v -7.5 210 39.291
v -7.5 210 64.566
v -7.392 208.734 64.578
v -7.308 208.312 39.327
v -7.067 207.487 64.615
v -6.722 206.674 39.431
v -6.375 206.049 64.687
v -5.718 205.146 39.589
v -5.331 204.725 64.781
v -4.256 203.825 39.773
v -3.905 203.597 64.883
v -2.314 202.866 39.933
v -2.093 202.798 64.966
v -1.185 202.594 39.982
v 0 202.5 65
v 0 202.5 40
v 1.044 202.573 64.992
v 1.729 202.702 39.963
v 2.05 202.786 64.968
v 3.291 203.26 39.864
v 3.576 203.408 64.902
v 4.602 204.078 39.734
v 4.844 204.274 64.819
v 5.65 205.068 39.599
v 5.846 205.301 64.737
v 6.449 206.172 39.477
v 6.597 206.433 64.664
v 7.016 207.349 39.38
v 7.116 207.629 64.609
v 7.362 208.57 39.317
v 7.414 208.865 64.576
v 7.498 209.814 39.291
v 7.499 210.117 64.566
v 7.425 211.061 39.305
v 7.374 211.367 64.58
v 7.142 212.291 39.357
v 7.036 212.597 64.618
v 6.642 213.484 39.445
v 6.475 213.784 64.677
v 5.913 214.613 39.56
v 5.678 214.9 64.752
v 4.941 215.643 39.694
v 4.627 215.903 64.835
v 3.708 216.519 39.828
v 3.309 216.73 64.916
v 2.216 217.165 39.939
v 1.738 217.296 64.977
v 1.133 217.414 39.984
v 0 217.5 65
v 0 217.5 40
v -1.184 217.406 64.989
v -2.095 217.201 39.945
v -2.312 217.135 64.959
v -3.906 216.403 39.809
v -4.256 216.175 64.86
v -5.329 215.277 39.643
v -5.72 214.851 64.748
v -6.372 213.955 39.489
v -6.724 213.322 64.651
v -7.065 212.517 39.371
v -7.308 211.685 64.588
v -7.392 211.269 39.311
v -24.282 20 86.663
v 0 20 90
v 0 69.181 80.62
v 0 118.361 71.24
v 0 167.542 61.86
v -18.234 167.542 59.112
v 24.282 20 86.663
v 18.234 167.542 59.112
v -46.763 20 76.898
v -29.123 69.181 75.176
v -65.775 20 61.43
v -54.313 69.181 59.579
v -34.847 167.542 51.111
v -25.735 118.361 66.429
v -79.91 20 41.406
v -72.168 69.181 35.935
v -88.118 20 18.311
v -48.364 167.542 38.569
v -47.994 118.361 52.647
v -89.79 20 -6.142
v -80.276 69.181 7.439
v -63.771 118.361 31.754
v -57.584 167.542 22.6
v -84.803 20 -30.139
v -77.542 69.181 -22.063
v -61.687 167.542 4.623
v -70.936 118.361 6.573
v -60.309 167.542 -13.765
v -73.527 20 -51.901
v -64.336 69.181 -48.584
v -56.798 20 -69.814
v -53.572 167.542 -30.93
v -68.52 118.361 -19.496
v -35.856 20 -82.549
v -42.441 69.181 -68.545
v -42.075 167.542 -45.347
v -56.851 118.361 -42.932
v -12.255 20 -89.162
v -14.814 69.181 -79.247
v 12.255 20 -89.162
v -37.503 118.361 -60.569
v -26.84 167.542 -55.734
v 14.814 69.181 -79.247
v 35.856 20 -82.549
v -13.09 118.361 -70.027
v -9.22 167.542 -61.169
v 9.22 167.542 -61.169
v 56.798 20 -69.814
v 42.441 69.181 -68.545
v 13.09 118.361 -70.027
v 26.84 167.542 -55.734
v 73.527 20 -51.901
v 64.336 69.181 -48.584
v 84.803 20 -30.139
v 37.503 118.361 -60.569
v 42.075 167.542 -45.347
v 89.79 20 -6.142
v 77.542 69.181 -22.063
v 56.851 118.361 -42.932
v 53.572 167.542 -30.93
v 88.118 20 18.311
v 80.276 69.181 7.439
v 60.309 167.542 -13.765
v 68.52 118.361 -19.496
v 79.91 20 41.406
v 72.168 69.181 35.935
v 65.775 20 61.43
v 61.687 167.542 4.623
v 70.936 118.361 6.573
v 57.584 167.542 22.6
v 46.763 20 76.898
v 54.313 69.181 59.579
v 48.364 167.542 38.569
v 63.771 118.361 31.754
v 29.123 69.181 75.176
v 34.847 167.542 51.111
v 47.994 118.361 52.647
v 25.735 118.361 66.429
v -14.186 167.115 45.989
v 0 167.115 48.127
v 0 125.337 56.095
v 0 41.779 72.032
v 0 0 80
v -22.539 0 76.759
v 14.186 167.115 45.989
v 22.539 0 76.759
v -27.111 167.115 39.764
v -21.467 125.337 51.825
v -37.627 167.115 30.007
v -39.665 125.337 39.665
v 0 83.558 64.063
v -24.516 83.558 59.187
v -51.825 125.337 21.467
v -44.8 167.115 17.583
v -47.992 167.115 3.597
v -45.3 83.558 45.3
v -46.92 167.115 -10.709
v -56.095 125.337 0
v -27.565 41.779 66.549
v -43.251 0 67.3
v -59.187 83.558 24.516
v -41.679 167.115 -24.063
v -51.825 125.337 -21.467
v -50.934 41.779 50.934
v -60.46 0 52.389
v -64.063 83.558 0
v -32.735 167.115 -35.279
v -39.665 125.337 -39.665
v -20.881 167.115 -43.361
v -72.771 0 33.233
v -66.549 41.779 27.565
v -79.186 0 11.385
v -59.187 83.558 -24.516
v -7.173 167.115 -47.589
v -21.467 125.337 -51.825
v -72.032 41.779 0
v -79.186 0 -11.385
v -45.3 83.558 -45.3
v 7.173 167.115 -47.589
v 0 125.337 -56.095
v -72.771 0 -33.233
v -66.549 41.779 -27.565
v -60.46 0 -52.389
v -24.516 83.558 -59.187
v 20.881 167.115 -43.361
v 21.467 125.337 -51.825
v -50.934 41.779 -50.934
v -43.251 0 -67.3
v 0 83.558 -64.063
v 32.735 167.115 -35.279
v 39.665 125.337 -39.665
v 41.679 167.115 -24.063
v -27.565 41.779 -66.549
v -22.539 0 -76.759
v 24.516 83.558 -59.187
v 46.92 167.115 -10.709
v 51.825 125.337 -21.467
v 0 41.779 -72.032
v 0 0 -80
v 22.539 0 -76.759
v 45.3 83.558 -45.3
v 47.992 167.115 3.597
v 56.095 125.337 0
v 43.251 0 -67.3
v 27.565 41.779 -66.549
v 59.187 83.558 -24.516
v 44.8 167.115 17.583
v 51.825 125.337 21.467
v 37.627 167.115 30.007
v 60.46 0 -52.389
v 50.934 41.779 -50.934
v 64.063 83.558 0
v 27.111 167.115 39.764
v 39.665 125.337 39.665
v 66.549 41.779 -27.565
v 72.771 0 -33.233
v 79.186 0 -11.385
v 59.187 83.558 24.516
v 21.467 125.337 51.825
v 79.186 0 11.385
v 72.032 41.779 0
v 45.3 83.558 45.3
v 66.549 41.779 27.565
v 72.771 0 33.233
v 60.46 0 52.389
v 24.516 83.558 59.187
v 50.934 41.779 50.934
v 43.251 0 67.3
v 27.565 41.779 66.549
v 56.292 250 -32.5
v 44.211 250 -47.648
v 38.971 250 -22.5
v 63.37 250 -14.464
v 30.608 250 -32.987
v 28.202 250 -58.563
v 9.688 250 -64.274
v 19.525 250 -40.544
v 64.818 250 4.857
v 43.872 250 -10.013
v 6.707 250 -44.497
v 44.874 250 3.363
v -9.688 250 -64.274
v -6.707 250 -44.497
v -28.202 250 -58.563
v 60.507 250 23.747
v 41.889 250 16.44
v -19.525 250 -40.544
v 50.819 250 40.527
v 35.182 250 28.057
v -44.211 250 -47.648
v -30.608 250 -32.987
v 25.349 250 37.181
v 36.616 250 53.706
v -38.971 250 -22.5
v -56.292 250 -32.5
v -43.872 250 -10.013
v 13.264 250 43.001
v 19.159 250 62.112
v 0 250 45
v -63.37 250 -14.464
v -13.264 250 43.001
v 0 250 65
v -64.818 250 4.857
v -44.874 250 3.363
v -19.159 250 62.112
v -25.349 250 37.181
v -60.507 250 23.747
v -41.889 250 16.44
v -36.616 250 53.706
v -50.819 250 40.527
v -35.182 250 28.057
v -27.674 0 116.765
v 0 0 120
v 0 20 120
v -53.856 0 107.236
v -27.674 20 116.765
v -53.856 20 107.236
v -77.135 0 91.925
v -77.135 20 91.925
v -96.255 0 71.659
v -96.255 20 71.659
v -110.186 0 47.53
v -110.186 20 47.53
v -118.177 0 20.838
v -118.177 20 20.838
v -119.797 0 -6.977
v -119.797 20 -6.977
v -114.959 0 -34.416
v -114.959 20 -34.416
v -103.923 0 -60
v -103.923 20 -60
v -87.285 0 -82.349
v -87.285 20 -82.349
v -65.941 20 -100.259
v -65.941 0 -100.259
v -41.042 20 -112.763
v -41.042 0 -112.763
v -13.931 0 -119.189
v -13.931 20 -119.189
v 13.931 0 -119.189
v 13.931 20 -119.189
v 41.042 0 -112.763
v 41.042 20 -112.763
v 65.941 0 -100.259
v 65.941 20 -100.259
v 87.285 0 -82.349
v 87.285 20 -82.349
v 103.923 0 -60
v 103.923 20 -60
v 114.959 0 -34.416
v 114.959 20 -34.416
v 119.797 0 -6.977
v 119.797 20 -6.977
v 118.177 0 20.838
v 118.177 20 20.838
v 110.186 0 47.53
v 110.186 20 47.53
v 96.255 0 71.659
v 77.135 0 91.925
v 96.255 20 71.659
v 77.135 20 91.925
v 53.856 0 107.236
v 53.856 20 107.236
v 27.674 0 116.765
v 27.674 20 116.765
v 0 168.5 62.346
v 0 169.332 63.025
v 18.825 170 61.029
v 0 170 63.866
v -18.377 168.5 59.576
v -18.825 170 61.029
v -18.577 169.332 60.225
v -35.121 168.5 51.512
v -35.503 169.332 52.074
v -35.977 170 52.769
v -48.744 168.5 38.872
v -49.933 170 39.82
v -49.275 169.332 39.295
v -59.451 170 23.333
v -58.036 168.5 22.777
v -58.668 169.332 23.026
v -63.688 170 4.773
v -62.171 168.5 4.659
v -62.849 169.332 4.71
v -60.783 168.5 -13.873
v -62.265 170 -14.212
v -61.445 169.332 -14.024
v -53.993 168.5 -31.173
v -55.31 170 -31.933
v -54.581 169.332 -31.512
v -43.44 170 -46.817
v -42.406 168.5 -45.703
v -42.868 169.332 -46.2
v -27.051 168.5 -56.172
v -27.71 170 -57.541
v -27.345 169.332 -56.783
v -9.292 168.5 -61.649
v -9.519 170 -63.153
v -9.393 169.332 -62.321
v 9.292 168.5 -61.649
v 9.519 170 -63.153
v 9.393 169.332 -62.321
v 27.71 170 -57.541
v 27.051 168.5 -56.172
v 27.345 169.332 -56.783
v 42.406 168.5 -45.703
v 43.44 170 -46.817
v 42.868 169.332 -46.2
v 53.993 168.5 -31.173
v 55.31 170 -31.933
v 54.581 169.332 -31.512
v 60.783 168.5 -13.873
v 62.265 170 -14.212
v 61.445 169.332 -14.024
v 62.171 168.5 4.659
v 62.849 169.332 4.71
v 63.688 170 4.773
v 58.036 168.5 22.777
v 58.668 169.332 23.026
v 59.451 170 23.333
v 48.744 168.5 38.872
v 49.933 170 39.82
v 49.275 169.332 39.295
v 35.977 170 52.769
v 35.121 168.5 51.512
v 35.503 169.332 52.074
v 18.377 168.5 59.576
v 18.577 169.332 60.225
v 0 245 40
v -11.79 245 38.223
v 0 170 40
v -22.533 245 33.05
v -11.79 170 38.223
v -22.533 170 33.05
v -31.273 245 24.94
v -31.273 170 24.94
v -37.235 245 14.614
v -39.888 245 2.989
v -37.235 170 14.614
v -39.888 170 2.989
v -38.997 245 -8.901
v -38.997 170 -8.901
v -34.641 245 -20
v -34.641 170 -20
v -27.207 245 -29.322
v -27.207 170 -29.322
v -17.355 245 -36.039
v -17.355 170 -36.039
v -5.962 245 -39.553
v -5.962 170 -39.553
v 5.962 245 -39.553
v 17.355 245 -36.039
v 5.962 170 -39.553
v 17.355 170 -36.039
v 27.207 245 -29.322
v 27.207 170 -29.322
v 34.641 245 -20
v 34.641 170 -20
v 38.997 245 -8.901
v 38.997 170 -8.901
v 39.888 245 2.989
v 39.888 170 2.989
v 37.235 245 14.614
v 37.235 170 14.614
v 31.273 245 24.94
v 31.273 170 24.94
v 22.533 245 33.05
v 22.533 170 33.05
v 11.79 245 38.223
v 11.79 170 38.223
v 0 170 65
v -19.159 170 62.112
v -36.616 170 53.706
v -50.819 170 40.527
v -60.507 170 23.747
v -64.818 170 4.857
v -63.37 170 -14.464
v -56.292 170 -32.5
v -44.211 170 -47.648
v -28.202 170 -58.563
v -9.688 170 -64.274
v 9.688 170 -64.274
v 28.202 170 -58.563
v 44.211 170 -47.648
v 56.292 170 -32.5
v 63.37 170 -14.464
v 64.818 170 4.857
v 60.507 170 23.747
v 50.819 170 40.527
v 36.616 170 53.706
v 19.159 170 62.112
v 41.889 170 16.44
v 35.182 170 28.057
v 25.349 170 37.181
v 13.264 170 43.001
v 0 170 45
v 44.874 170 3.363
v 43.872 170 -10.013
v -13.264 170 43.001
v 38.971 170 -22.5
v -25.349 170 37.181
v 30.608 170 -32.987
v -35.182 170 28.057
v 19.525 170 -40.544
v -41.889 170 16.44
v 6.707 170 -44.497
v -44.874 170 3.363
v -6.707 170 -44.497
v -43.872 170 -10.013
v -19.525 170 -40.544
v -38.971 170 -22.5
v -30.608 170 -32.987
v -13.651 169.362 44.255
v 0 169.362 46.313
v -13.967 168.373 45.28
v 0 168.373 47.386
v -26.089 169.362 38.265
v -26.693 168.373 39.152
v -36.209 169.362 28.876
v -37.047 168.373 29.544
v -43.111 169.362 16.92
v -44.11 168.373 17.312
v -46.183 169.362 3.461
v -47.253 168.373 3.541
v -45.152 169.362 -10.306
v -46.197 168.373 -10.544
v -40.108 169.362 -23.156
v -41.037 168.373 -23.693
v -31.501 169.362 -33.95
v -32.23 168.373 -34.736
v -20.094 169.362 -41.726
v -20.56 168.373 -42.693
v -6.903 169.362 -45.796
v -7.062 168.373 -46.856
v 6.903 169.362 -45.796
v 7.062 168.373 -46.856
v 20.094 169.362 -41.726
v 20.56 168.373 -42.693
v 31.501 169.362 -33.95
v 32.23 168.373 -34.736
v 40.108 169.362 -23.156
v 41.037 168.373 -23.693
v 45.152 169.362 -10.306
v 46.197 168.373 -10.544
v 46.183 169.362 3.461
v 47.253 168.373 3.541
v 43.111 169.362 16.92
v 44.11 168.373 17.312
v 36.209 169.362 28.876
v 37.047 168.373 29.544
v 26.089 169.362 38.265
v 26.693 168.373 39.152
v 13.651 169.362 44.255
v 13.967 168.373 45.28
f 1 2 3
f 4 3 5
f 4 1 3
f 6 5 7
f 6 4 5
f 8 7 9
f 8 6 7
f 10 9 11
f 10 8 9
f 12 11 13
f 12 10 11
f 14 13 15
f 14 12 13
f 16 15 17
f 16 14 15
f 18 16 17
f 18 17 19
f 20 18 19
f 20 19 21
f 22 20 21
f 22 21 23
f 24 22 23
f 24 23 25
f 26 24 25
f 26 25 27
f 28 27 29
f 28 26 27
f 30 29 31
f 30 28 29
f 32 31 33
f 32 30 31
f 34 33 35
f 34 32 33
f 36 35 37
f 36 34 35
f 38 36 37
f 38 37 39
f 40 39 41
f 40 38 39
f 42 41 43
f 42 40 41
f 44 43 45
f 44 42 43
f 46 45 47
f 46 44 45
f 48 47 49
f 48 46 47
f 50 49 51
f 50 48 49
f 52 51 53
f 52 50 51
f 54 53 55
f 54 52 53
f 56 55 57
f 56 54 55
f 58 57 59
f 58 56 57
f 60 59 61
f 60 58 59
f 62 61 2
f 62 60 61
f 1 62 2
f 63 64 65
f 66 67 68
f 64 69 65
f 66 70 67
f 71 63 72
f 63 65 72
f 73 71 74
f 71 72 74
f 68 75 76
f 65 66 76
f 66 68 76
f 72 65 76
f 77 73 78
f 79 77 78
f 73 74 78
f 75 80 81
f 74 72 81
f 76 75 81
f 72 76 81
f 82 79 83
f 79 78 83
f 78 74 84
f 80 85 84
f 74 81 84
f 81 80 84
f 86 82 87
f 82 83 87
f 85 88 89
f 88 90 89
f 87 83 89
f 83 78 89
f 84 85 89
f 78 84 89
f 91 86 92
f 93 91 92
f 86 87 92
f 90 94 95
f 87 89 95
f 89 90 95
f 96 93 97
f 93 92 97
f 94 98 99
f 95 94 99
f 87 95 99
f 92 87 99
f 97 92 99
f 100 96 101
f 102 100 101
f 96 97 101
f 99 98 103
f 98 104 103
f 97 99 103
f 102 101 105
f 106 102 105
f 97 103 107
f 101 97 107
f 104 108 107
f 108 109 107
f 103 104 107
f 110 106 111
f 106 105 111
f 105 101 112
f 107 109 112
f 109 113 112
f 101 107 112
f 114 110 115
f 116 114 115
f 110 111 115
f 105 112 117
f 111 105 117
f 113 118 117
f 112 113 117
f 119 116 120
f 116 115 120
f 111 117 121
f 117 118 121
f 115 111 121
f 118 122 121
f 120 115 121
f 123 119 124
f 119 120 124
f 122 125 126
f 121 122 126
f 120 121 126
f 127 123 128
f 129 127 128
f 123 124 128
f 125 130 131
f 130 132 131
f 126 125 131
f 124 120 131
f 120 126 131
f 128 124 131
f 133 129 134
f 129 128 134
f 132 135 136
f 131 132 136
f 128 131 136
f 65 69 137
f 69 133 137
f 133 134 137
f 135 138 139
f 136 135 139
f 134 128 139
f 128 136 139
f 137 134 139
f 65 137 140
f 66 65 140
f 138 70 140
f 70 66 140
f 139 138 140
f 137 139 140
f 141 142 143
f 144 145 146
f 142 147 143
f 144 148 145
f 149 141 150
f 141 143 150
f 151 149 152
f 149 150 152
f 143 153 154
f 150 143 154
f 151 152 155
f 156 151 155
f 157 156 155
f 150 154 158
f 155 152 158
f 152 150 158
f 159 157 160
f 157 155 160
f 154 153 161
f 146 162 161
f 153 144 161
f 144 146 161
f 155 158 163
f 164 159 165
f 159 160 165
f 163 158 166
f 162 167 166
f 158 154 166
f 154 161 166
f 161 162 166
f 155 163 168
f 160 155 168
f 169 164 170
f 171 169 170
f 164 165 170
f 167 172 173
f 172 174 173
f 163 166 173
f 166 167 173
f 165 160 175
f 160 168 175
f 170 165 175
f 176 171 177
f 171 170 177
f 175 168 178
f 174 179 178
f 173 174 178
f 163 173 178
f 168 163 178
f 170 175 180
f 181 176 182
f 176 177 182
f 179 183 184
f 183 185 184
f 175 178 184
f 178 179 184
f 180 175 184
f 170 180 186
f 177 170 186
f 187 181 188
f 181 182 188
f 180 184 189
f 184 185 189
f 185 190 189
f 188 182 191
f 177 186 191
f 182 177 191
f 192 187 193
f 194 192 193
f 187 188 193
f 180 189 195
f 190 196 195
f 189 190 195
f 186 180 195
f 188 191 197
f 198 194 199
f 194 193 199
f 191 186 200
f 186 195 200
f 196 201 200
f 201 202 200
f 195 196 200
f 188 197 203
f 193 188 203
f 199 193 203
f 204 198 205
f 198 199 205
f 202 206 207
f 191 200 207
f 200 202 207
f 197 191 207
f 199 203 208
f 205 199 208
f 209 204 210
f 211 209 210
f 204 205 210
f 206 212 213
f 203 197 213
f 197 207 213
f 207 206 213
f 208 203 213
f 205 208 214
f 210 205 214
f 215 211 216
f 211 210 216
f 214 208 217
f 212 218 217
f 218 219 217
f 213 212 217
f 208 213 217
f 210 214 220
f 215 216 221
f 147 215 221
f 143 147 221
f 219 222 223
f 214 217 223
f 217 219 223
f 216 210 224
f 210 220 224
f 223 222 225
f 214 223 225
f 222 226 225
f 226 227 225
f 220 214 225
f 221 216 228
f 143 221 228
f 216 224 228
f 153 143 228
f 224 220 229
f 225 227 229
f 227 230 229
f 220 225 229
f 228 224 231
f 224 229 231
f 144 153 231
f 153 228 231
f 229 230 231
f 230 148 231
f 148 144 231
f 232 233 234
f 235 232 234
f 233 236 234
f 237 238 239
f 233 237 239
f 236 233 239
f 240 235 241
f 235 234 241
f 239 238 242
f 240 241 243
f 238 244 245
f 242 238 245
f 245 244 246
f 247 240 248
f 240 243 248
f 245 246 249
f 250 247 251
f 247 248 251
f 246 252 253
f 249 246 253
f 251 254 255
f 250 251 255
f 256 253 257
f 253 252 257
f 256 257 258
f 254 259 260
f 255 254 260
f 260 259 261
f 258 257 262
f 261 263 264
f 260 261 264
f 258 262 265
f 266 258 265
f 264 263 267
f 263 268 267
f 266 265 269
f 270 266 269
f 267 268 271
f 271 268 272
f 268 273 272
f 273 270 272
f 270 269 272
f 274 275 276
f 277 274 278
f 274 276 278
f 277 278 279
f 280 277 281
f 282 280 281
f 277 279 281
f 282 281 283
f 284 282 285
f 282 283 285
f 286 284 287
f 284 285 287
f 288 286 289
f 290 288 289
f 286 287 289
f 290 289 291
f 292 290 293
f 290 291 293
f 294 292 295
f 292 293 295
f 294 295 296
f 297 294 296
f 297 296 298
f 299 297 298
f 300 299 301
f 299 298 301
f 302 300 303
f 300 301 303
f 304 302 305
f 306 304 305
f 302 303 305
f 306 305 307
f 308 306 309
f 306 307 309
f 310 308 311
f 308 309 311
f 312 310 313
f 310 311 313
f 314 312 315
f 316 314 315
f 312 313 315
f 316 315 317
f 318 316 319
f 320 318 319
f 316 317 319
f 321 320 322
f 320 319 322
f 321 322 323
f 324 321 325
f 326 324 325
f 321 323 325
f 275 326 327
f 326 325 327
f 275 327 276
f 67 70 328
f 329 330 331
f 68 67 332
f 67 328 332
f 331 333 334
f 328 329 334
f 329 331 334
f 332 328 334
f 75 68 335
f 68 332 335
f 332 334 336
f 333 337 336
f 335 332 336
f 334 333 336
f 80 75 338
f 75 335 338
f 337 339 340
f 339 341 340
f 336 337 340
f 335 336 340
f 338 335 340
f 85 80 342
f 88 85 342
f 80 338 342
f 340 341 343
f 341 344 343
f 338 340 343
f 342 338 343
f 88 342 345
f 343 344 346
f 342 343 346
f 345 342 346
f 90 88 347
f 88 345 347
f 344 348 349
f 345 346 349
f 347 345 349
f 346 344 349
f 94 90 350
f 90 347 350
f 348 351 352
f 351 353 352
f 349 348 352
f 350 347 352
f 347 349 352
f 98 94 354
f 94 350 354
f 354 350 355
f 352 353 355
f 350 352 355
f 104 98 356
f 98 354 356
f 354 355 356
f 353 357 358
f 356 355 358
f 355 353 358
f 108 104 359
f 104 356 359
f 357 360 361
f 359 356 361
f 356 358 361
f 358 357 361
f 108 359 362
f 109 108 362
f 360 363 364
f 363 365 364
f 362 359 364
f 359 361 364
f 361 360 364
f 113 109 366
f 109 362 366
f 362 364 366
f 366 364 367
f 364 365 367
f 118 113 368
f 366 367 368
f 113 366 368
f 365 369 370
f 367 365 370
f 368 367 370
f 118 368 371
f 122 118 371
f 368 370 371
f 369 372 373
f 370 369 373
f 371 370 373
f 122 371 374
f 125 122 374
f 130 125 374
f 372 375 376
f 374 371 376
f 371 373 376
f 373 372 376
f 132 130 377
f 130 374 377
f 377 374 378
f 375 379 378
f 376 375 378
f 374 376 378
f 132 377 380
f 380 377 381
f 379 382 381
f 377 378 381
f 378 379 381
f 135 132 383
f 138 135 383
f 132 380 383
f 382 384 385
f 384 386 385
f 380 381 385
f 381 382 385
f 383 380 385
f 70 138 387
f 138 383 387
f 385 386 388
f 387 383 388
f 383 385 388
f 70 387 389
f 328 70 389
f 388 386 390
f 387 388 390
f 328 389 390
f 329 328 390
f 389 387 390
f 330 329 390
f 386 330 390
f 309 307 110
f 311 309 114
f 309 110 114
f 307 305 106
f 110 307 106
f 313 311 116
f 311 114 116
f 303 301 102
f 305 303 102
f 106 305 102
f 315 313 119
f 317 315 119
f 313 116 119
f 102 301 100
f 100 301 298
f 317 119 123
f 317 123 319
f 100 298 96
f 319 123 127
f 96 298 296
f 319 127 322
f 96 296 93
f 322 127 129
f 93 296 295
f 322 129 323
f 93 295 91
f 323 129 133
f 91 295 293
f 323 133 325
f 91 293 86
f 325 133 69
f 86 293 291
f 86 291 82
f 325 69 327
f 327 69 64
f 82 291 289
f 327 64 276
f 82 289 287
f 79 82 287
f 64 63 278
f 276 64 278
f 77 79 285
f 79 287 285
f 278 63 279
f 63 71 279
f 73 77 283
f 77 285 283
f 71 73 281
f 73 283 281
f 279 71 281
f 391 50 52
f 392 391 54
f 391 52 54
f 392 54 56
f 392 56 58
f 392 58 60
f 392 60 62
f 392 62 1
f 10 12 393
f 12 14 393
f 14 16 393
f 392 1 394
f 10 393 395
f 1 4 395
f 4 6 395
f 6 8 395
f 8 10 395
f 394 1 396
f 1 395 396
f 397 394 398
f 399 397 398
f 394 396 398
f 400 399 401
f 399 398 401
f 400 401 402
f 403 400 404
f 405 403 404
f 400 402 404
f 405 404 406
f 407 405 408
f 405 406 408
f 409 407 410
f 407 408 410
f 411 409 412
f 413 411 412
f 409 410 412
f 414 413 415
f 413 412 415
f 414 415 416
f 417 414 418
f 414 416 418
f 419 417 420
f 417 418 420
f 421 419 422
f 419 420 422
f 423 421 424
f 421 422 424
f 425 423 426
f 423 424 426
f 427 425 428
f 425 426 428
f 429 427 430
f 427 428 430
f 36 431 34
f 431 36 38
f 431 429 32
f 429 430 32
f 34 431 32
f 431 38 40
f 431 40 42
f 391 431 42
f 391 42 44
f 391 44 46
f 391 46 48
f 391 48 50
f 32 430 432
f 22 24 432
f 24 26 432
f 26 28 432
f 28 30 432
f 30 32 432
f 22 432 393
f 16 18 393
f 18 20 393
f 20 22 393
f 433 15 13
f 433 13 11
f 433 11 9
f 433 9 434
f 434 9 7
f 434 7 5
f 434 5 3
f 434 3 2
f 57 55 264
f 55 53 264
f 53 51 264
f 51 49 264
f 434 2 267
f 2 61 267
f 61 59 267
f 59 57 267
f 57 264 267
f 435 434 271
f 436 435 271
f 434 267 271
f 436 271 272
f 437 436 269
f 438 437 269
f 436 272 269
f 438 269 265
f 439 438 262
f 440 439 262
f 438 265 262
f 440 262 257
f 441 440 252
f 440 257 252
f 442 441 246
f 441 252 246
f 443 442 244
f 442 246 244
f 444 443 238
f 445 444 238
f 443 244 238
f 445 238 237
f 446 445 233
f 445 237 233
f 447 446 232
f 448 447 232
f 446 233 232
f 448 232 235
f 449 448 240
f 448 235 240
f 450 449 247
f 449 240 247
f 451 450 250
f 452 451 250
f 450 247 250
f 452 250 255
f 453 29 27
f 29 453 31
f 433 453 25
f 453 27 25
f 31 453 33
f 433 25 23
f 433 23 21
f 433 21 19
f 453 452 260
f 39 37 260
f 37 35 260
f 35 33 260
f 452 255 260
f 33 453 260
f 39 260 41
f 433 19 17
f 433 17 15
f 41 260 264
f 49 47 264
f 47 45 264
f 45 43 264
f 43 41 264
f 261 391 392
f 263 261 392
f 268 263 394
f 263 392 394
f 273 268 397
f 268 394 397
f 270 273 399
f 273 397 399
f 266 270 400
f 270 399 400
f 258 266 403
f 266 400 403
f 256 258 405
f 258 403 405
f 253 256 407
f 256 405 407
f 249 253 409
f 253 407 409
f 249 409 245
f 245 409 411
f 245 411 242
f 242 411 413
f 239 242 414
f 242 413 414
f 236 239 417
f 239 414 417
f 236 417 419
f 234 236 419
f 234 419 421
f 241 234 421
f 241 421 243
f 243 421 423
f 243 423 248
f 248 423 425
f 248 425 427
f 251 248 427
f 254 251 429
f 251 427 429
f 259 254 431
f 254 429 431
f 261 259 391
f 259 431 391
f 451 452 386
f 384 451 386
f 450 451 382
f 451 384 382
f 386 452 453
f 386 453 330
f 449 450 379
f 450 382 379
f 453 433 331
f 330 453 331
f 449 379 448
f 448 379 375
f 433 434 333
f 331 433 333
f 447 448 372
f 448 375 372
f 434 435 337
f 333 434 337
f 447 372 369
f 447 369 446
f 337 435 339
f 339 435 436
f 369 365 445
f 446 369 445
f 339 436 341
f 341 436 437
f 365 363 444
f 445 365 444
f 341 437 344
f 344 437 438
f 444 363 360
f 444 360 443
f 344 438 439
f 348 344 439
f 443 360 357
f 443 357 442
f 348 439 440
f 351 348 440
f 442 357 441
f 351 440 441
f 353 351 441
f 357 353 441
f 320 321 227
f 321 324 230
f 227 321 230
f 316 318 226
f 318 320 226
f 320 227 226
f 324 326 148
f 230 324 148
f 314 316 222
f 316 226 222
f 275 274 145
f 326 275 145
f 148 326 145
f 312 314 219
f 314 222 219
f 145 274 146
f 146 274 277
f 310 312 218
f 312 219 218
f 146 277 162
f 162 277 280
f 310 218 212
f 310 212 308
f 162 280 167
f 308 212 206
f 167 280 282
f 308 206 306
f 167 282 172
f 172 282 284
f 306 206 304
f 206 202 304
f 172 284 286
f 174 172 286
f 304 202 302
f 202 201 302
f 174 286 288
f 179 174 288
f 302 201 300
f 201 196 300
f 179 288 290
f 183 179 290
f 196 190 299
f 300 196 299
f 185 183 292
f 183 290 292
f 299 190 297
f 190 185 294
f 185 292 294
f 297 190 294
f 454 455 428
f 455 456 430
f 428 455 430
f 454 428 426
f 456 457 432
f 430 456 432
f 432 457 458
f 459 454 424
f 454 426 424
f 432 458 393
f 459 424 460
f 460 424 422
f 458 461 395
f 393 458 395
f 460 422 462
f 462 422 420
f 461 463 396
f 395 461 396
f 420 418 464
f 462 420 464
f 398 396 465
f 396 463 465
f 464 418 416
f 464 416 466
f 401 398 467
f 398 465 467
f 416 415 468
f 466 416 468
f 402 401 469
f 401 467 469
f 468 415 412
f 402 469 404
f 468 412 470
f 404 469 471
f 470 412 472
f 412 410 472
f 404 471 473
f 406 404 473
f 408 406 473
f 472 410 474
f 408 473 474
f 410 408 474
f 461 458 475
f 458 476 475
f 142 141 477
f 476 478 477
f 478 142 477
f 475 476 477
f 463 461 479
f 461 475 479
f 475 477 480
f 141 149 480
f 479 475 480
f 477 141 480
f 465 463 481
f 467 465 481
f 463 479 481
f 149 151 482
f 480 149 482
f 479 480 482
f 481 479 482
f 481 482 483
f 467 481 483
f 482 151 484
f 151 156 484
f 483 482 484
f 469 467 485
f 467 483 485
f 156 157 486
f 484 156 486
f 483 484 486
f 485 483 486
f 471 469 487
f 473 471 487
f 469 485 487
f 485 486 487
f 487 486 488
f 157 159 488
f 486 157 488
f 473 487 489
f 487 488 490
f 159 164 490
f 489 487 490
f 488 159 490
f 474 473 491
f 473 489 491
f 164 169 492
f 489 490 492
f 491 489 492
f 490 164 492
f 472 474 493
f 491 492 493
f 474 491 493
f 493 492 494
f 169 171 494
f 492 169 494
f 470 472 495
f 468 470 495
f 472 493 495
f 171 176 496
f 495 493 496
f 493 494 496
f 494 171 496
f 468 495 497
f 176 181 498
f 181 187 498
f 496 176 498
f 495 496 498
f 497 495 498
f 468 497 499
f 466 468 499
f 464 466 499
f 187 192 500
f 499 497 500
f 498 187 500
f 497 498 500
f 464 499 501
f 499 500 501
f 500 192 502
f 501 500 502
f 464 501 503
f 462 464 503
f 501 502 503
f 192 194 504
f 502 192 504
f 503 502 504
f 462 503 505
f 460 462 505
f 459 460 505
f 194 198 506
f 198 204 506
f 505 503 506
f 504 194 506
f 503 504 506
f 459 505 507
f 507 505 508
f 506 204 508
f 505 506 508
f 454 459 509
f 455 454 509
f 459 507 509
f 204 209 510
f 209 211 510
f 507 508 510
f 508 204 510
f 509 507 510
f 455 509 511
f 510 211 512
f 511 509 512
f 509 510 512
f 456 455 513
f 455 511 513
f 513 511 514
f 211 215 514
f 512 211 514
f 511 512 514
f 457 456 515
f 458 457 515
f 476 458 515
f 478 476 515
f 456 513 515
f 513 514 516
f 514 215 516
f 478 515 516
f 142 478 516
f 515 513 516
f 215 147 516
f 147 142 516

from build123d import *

# Parameters (mm, degrees)
CHAMFER1_SIZE           = 5
CUT_EXTRUDE1_REACH      = 304.159
CUT_EXTRUDE1_END_RADIUS = 65
SKETCH2_R               = 7.5


with BuildPart() as part:
    # Sketch1 → Revolve1 (revolve)
    with BuildSketch(Plane.XY, mode=Mode.PRIVATE) as revolve1_sk:
        with BuildLine():
            Line((80, 0), (120, 0))
            Line((120, 0), (120, 20))
            Line((120, 20), (90, 20))
            Line((90, 20), (61.860013717, 167.541531884))
            ThreePointArc((61.860013717, 167.541531884), (62.662860491, 168.934123661), (63.866098802, 170))
            Line((63.866098802, 170), (65, 170))
            Line((65, 170), (65, 250))
            Line((65, 250), (40, 250))
            Line((40, 250), (40, 170))
            Line((40, 170), (45, 170))
            ThreePointArc((45, 170), (46.885443724, 168.906865887), (48.126751856, 167.115499273))
            Line((48.126751856, 167.115499273), (80, 0))
        make_face()
    revolve(revolve1_sk.sketch.rotate(Axis((0, 126.434782609, 0), (0, -1, 0)), 90), axis=Axis((0, 126.434782609, 0), (0, -1, 0)))

    # Chamfer1
    chamfer1_edges = [part.edges().sort_by_distance(p)[0] for p in [
        (0, 250, -40),
    ]]
    chamfer(chamfer1_edges, length=CHAMFER1_SIZE)

    # Cut-Extrude1: up to this cylinder (the profile starts inside it)
    cut_extrude1_end = Plane(origin=(0, 210, 0), z_dir=(0, 1, 0)) * Cylinder(CUT_EXTRUDE1_END_RADIUS, 739.318, mode=Mode.PRIVATE)
    # Sketch2 → Cut-Extrude1 (cut, up to the surface)
    with BuildSketch(Plane.XY, mode=Mode.PRIVATE) as cut_extrude1_sk1:
        with Locations(Location((0, 210, 0), (0, 0, 180))):
            Circle(SKETCH2_R)
    cut_extrude1_tool1 = extrude(cut_extrude1_sk1.sketch, amount=CUT_EXTRUDE1_REACH, mode=Mode.PRIVATE) & cut_extrude1_end
    add(cut_extrude1_tool1.solids().sort_by_distance((0, 210, 0))[0], mode=Mode.SUBTRACT)


solid = part.part
